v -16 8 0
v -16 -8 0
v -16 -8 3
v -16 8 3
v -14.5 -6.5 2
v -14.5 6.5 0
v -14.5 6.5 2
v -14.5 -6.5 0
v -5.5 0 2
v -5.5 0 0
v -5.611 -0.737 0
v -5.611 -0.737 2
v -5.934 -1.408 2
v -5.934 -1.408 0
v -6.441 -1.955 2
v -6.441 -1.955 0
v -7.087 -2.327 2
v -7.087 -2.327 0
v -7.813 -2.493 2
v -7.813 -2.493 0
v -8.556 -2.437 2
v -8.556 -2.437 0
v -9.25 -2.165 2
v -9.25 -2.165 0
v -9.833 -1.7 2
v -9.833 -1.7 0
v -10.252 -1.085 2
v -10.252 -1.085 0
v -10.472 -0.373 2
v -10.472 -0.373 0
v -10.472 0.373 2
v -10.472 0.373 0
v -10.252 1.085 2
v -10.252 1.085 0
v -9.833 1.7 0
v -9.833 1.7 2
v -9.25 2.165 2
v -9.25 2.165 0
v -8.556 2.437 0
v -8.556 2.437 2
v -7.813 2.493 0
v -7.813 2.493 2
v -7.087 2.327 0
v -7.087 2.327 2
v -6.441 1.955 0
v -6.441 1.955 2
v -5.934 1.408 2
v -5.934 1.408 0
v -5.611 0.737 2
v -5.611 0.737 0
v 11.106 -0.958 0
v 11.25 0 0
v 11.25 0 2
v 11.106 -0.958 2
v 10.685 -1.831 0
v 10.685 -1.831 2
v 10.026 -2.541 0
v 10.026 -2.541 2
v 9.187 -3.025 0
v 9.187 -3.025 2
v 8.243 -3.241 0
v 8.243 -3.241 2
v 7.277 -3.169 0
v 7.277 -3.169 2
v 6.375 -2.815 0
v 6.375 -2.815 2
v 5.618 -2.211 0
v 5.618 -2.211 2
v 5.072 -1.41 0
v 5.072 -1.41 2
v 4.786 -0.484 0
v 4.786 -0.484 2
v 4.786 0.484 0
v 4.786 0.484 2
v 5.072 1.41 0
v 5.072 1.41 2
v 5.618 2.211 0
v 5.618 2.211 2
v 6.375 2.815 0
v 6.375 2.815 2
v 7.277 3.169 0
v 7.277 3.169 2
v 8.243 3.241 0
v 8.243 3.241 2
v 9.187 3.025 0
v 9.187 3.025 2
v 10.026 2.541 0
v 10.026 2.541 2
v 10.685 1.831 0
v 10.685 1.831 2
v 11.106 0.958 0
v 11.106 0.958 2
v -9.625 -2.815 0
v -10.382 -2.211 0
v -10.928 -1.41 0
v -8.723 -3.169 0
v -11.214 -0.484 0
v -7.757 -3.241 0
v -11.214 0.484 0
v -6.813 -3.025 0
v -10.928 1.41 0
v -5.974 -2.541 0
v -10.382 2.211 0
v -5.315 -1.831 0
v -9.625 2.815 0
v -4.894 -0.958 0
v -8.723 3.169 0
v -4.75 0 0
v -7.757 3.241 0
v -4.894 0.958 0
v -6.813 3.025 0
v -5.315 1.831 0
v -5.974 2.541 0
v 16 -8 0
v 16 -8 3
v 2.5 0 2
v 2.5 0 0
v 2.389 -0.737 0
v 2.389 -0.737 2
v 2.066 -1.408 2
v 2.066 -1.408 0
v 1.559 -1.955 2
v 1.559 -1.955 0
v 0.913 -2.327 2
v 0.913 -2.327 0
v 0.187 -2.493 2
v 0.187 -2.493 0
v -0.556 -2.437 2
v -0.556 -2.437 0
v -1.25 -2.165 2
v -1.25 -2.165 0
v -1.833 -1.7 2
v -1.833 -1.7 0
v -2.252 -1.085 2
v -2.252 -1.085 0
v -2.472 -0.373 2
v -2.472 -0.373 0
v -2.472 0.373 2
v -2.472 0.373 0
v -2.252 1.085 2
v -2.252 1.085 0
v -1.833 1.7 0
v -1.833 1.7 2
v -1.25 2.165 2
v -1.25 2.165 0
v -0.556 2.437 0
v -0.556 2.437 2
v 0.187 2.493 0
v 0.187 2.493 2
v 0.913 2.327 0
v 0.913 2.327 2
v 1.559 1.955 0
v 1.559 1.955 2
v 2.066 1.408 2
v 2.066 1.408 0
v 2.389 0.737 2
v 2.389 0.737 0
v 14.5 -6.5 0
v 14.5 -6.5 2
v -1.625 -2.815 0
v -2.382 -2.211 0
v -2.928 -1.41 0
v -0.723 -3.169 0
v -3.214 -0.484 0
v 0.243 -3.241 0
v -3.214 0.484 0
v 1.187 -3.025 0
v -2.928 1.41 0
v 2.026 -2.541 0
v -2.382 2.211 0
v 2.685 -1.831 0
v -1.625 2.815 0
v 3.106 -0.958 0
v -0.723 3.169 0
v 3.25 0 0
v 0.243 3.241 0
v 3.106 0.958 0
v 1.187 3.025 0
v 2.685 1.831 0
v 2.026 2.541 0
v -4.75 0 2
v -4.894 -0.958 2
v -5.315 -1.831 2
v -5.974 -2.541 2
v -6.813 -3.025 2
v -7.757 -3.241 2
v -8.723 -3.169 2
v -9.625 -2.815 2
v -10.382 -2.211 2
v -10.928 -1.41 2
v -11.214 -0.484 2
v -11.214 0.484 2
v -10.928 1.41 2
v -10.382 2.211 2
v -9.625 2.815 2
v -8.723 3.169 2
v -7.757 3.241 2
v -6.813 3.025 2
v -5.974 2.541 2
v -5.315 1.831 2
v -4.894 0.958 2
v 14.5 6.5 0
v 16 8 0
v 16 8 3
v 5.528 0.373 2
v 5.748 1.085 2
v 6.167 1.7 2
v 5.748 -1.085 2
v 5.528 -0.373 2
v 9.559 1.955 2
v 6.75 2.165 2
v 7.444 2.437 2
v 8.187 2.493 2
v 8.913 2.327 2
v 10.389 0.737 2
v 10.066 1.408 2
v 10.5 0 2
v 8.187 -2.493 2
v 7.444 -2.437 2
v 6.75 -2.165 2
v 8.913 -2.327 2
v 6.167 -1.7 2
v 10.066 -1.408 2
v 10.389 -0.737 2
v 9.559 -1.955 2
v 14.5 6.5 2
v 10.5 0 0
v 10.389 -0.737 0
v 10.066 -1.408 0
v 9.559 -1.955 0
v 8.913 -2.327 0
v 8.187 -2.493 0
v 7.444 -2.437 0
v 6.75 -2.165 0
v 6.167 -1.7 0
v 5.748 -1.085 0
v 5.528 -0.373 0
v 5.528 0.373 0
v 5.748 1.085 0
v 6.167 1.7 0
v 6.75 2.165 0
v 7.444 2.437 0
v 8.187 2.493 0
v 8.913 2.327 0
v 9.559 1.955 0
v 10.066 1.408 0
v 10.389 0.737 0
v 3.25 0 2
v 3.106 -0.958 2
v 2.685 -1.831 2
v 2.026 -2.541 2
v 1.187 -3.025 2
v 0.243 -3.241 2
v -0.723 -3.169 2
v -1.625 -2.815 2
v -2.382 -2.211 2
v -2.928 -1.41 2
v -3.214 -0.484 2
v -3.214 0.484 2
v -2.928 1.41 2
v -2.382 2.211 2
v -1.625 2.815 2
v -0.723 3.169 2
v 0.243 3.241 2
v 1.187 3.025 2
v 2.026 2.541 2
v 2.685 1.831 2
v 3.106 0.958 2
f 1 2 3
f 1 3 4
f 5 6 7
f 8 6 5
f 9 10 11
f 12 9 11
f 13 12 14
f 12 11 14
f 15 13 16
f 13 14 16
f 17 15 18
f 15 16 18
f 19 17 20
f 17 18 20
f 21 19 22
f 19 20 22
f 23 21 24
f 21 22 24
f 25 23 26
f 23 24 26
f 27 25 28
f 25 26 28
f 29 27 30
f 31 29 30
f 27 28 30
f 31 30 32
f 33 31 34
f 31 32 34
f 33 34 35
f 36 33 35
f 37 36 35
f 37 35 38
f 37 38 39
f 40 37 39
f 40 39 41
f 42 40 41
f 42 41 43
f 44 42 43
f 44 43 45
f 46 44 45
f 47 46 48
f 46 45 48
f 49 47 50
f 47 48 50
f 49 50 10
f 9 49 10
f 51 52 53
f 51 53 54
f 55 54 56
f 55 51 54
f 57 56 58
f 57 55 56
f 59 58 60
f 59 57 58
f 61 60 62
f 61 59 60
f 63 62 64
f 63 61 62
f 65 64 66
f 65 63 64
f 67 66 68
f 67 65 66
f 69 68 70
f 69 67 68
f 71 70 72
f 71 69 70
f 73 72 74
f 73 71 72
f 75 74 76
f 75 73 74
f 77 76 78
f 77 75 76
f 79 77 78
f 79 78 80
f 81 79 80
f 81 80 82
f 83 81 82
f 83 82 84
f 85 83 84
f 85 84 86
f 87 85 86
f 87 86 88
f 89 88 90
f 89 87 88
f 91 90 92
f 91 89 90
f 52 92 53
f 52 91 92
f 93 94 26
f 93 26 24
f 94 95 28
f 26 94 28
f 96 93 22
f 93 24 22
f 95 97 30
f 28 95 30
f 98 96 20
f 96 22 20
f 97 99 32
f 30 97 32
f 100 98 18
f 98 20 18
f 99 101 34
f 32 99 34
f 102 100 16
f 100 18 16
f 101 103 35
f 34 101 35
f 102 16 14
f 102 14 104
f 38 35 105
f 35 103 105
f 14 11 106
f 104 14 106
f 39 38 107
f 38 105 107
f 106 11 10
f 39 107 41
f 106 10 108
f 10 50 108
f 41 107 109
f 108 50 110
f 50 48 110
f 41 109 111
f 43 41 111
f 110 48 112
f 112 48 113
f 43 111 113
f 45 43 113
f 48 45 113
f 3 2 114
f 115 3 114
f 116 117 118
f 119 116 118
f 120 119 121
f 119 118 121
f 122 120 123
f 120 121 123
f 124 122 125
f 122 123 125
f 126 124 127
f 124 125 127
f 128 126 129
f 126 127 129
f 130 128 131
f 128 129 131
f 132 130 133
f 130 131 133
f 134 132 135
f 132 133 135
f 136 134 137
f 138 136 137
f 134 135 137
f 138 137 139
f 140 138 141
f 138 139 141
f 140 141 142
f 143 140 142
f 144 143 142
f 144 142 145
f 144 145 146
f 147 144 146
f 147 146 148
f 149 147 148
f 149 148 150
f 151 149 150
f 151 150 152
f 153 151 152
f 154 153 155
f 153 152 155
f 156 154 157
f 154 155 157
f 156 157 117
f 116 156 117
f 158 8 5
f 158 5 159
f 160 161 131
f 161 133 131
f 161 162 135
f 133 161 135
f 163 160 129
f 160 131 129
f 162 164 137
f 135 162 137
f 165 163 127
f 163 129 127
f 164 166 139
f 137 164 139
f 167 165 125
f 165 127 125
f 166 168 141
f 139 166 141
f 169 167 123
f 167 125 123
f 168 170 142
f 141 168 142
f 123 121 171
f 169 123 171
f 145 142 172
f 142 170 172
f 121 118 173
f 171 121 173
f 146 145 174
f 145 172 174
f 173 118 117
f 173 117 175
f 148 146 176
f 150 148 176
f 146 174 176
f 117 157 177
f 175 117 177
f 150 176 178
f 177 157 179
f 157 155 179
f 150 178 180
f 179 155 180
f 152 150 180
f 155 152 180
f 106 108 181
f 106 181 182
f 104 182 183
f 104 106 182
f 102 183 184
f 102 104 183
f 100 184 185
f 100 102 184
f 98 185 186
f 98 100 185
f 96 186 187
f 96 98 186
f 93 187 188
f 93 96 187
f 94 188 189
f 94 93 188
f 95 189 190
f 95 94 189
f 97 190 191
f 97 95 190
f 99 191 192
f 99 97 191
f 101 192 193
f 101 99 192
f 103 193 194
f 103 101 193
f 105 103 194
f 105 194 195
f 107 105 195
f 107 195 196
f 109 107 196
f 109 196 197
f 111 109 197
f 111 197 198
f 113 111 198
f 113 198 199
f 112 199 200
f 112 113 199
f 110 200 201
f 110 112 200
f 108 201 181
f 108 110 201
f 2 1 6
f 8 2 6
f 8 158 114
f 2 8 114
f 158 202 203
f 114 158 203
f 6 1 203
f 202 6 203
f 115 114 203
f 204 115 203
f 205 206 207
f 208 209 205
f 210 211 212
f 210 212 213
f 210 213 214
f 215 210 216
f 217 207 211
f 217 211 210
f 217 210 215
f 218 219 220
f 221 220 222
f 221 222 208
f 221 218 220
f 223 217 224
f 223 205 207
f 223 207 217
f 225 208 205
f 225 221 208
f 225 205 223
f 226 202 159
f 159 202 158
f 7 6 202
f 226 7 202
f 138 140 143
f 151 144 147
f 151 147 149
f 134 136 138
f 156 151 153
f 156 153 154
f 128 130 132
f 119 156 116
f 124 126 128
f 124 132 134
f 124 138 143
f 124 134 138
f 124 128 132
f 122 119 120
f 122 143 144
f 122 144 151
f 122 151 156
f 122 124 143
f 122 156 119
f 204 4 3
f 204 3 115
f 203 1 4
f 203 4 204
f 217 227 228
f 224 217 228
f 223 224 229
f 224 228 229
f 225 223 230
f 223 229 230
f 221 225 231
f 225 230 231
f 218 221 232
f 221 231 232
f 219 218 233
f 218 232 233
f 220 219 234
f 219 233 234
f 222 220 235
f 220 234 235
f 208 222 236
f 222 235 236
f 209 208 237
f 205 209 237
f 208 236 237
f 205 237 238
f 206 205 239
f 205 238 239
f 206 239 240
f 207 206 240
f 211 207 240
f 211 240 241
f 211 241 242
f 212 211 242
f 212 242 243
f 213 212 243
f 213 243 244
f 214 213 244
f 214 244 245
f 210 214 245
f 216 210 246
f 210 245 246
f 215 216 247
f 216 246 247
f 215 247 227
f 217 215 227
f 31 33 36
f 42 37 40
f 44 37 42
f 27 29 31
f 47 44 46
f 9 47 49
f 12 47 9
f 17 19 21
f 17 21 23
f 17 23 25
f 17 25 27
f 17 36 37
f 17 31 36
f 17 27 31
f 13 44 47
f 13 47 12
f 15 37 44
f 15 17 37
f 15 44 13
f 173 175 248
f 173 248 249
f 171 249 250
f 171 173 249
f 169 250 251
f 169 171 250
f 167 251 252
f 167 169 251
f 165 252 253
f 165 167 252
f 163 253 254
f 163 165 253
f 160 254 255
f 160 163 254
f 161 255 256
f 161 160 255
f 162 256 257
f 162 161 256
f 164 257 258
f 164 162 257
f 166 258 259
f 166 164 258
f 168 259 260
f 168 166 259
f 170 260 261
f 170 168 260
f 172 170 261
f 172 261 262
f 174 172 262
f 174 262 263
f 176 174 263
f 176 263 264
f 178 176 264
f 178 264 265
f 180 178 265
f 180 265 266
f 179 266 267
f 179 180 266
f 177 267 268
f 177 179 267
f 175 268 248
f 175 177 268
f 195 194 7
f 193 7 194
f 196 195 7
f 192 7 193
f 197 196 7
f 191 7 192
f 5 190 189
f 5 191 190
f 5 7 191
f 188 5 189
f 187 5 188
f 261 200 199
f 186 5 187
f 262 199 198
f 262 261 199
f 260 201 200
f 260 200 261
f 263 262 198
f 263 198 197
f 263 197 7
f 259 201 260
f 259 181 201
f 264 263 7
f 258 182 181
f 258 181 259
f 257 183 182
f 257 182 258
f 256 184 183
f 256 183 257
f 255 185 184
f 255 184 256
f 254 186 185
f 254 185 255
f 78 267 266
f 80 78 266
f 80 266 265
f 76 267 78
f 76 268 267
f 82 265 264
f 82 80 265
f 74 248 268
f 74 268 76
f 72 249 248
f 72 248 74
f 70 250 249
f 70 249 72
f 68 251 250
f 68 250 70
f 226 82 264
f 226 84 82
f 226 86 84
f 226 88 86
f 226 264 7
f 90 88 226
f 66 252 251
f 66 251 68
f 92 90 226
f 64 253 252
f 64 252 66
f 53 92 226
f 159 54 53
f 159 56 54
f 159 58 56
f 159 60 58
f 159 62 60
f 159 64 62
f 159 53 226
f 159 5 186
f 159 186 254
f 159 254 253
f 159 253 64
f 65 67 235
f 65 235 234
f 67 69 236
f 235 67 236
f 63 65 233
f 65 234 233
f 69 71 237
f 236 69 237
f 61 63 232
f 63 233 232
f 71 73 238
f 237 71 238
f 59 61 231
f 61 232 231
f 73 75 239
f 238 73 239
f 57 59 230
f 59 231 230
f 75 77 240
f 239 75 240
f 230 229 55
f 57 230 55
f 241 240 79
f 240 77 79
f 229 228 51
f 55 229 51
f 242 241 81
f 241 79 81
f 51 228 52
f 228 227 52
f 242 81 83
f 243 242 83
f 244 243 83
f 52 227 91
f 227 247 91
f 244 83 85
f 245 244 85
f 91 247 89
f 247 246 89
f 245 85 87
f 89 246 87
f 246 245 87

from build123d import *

# Parameters (mm, degrees)
F0_W     = 32
F0_H     = 16
F1_DEPTH = 3
F2_W     = 29
F2_H     = 13
F2_R     = 3.25
F2_R_2   = 2.5
F3_DEPTH = 2


with BuildPart() as f1:
    # F0 (on Top) → F1 (new body)
    with BuildSketch(Plane.XY):
        Rectangle(F0_W, F0_H)
    extrude(amount=F1_DEPTH)

    # F2 (on face) → F3 (cut)
    with BuildSketch(Plane(origin=(0, 0, 0), x_dir=(1, 0, 0), z_dir=(0, 0, -1))):
        Rectangle(F2_W, F2_H)
        with Locations((-8, 0)):
            Circle(F2_R, mode=Mode.SUBTRACT)
        Circle(F2_R, mode=Mode.SUBTRACT)
        with Locations((8, 0)):
            Circle(F2_R, mode=Mode.SUBTRACT)
        with Locations((-8, 0)):
            Circle(F2_R_2)
        Circle(F2_R_2)
        with Locations((8, 0)):
            Circle(F2_R_2)
    extrude(amount=-F3_DEPTH, mode=Mode.SUBTRACT)


solid = f1.part
